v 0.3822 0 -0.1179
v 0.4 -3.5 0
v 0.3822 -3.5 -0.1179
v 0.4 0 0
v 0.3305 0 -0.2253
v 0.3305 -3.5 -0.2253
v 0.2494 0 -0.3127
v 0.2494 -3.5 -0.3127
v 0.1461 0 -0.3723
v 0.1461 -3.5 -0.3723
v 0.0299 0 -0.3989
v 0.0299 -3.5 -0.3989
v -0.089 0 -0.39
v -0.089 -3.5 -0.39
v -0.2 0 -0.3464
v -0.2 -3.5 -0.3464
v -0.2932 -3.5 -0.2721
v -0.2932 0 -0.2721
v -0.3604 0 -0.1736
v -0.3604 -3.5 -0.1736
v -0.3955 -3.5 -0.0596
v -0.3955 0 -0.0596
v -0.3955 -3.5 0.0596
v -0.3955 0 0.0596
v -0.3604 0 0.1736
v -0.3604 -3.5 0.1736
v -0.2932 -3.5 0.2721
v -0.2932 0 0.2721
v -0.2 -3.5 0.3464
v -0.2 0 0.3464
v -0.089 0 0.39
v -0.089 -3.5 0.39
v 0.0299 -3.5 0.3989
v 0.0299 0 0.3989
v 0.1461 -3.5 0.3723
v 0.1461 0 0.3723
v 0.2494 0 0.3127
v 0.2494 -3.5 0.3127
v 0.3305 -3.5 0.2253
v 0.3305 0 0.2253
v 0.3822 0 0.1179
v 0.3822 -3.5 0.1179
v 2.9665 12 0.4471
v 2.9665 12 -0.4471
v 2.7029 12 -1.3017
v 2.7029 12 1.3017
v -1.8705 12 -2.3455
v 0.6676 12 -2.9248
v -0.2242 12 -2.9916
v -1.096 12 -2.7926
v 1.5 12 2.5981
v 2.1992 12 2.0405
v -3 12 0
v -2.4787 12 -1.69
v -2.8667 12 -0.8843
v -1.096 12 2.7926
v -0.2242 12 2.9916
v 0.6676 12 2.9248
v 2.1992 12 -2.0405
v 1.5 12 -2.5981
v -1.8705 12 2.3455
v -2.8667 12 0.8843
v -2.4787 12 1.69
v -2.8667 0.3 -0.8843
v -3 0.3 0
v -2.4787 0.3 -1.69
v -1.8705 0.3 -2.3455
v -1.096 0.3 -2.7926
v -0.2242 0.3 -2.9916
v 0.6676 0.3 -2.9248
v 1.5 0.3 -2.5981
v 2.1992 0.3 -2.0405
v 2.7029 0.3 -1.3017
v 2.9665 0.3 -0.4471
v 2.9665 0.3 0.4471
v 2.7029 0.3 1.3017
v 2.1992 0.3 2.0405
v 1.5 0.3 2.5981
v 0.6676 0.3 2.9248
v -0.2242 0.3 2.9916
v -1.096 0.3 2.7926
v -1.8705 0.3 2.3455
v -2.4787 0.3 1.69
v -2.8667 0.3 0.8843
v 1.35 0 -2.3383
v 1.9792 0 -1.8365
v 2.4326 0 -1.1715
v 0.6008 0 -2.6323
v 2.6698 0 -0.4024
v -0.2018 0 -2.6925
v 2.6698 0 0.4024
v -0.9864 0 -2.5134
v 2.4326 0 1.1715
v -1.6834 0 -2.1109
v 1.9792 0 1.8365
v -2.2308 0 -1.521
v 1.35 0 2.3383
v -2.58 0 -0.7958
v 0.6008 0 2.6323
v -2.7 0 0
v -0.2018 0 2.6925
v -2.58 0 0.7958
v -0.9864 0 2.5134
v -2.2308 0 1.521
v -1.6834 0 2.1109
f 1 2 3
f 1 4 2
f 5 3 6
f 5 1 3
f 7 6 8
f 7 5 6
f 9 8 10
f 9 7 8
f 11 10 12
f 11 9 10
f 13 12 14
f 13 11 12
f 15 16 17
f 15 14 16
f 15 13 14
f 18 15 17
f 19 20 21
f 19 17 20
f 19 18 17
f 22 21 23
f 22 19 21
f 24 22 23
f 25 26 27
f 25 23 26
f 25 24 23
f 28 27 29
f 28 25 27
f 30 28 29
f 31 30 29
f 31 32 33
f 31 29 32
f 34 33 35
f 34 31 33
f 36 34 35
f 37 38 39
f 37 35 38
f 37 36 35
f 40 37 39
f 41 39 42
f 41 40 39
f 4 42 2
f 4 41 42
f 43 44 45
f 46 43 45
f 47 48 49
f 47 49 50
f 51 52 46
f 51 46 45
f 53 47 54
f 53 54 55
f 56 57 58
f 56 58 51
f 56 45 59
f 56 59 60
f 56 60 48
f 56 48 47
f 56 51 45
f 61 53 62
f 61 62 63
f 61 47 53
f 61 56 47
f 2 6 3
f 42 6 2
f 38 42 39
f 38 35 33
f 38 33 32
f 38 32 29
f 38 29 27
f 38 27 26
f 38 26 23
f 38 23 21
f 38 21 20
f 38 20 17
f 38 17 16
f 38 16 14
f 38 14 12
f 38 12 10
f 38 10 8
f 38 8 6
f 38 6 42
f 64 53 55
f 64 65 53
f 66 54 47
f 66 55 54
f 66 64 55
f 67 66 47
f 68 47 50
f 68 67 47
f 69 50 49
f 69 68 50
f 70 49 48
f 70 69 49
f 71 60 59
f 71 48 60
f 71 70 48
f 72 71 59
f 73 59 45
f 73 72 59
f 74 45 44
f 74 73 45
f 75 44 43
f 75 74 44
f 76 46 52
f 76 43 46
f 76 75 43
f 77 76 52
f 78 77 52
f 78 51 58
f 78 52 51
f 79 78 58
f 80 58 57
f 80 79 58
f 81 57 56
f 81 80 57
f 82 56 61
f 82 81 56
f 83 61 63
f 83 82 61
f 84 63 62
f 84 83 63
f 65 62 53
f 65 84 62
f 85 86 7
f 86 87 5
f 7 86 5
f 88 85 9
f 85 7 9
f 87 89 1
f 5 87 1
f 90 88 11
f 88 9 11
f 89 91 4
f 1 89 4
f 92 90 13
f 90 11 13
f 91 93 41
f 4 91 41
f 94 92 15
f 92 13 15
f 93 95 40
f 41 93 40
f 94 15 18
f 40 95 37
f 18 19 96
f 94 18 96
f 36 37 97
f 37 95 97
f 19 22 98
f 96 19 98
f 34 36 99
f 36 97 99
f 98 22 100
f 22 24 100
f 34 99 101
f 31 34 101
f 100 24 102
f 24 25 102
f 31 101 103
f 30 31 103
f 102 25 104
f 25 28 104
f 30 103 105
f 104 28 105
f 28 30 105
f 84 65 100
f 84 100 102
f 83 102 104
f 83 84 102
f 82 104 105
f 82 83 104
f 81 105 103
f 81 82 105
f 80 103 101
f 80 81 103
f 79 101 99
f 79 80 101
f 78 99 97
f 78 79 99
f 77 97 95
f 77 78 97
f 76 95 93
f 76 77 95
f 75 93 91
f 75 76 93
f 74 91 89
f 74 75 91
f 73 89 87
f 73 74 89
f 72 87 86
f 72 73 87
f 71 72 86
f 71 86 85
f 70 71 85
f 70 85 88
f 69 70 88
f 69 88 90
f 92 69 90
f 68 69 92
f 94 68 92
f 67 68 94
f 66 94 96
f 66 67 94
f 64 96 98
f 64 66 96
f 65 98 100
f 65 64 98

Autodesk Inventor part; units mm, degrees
ref_plane "YZ Plane" through (0, 0, 0) normal (1, 0, 0) x (0, 1, 0)
ref_plane "XZ Plane" through (0, 0, 0) normal (0, 1, 0) x (-1, 0, 0)
ref_plane "XY Plane" through (0, 0, 0) normal (0, 0, 1) x (1, 0, 0)
sketch "スケッチ1" plane through (0, 0, 0) normal (0, 1, 0) x (-1, 0, 0)
  circle A0 centre (0, 0) radius 3
  dimension "d0" = 6
extrude "押し出し1" add sketch "スケッチ1" along normal blind 12
chamfer "面取り1" distance 0.3 angle 45 1 edges at (3, 0, 0)
sketch "スケッチ2" plane through (0, 0, 0) normal (0, -1, 0) x (1, 0, 0)
  circle A0 centre (0, 0) radius 0.4
  dimension "d6" = 0.8
extrude "押し出し2" add sketch "スケッチ2" along normal blind 3.5
properties part number "FanMotor"
